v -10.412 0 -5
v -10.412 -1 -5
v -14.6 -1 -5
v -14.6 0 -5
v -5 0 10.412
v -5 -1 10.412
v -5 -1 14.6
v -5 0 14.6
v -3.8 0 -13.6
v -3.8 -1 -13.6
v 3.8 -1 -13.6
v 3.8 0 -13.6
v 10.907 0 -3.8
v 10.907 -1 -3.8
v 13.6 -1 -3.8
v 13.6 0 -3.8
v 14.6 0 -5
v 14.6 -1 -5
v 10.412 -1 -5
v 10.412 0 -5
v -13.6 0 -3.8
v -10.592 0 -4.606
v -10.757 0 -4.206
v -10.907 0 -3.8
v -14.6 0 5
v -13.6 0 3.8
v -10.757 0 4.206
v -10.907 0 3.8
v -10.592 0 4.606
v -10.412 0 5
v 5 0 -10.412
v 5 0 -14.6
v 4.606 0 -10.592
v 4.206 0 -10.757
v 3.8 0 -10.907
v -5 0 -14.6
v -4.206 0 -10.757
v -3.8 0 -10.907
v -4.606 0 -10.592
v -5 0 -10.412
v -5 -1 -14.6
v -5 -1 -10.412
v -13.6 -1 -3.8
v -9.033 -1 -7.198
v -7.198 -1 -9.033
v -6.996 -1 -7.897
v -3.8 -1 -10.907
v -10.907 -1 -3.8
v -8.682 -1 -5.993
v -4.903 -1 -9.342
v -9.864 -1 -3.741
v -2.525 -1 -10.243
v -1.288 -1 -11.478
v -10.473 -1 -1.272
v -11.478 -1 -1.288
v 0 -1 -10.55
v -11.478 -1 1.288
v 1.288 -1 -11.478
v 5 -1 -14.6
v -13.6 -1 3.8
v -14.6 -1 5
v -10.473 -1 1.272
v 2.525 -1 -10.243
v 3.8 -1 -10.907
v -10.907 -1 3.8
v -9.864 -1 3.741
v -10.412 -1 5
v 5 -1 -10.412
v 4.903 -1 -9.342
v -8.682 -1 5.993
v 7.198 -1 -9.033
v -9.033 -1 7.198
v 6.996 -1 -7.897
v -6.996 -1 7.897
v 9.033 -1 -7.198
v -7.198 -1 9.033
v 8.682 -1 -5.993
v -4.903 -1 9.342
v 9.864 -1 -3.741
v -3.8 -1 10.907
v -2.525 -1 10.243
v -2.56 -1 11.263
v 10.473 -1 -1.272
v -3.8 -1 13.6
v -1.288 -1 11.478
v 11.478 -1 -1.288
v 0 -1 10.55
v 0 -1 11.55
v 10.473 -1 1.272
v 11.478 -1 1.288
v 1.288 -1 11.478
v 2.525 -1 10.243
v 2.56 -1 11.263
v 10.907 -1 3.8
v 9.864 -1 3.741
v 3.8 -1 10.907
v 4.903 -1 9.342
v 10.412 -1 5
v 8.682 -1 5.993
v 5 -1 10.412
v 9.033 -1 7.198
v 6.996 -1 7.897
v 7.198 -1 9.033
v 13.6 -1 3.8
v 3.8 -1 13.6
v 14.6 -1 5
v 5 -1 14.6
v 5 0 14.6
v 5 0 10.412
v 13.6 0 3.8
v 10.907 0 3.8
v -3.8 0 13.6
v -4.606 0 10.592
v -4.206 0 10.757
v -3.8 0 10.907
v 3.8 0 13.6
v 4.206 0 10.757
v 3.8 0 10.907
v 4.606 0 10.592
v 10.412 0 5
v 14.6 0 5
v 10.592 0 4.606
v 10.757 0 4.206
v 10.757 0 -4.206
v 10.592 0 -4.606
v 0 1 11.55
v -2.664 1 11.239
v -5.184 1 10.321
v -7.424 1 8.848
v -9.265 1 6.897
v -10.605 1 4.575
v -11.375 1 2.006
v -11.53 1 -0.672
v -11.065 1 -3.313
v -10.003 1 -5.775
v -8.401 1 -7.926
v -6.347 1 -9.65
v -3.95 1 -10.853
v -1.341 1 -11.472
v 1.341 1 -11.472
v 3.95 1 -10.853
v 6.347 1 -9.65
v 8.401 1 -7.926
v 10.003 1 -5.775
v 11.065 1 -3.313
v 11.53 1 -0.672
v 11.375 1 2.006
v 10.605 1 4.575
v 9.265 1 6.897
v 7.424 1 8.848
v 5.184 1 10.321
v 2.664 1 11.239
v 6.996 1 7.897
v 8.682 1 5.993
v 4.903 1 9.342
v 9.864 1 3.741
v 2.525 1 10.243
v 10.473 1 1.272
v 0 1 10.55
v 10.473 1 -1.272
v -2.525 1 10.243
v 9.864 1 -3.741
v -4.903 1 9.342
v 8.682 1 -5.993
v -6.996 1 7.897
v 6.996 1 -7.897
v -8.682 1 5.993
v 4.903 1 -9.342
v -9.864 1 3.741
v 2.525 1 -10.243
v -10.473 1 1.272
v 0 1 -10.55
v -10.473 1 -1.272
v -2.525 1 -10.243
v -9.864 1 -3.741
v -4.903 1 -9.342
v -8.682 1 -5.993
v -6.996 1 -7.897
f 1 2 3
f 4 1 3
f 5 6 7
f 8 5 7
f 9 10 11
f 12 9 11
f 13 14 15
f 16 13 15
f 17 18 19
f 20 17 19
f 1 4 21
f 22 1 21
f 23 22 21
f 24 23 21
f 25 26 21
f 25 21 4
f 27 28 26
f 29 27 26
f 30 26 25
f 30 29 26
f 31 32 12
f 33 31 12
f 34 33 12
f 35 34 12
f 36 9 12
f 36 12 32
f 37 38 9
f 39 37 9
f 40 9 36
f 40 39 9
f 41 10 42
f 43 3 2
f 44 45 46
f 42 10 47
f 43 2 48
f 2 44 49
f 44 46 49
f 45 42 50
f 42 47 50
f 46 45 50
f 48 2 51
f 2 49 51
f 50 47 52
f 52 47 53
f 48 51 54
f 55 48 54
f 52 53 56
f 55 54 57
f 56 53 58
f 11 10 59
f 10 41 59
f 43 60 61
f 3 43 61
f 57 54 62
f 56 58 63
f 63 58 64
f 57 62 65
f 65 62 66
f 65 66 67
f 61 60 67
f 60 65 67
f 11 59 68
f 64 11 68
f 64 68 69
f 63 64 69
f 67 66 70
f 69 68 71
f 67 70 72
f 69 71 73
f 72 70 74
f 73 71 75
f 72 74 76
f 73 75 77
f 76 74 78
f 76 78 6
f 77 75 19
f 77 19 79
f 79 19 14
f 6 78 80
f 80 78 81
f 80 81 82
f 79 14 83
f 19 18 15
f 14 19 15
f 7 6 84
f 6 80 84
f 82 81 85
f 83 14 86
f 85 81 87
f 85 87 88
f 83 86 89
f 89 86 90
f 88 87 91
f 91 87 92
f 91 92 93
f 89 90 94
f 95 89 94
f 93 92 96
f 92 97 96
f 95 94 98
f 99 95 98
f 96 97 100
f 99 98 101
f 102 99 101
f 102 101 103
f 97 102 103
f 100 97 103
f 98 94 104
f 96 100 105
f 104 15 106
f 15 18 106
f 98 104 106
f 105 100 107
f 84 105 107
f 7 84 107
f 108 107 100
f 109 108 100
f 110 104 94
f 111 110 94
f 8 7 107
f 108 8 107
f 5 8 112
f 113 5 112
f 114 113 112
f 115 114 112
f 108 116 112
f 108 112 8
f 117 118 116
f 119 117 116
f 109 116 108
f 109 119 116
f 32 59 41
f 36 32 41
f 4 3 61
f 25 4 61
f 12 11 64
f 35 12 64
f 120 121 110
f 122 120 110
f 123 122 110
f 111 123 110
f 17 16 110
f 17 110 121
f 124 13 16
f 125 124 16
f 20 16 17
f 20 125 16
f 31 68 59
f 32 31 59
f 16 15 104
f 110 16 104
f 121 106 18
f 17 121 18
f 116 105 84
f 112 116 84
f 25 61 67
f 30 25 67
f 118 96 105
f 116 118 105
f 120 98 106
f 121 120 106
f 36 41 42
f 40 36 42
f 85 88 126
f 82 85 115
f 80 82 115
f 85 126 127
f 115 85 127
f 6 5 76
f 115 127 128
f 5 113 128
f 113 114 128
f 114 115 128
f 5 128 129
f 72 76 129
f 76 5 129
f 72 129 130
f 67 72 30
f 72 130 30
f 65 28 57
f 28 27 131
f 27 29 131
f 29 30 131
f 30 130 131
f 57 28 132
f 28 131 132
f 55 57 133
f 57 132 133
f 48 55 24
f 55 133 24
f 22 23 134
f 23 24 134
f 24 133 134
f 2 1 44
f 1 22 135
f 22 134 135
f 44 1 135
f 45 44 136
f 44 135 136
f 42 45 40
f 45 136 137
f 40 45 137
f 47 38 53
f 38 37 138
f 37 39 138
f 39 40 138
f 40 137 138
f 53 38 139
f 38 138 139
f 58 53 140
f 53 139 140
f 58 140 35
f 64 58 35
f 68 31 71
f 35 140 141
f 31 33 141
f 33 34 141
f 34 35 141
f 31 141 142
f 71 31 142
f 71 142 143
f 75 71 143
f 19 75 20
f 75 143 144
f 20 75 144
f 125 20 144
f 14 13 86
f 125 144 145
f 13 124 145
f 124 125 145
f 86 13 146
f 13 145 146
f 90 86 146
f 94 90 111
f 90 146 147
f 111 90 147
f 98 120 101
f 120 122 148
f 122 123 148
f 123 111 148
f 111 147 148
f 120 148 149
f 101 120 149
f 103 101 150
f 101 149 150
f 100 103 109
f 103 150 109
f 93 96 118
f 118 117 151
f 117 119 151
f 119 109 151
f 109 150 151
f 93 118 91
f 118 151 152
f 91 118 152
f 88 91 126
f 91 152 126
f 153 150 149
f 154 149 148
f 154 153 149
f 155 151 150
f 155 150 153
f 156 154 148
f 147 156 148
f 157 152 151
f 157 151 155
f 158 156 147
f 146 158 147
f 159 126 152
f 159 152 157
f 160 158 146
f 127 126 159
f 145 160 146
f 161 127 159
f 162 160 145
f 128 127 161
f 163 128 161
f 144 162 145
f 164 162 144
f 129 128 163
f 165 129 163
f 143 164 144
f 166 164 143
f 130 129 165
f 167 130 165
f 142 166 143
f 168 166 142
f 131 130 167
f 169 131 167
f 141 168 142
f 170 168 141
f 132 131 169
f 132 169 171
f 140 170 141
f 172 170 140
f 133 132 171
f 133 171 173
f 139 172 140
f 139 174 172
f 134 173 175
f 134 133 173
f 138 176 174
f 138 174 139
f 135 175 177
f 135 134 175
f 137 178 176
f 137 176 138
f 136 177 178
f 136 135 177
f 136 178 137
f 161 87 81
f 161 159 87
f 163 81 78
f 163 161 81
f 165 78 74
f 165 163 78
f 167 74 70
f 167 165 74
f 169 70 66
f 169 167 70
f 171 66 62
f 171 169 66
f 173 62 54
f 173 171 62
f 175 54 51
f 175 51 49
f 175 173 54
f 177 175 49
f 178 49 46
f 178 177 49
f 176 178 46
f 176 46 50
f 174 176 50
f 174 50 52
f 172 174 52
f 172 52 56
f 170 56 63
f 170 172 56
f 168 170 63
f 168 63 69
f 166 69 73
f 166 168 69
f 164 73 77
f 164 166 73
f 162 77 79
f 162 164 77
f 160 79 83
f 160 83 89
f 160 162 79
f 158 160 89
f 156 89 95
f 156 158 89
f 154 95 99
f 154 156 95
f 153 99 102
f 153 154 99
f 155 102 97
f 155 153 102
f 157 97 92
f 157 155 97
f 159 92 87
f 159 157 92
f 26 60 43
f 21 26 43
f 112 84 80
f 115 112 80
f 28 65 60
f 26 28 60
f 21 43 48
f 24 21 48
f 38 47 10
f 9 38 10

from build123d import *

# Parameters (mm, degrees)
CROQUIS1_W              = 1
CROQUIS1_H              = 2
SALIENTE_EXTRUIR1_START = -1
SALIENTE_EXTRUIR1_DEPTH = 1
MATRIZC1_COUNT          = 4


with BuildPart() as part:
    # Croquis1 → Revolución1 (revolve)
    with BuildSketch(Plane.XY, mode=Mode.PRIVATE) as revoluci_n1_sk:
        with Locations((11.05, 0)):
            Rectangle(CROQUIS1_W, CROQUIS1_H)
    revolve(revoluci_n1_sk.sketch.rotate(Axis((0, 18.472461404, 0), (0, -1, 0)), 90), axis=Axis((0, 18.472461404, 0), (0, -1, 0)))

    # Croquis2 → Saliente-Extruir1 (add)
    with BuildSketch(Plane(origin=(0, 0, 0), x_dir=(1, 0, 0), z_dir=(0, 1, 0)).offset(SALIENTE_EXTRUIR1_START)):
        Polygon((-5, -10.411652126), (-5, -14.6), (5, -14.6), (5, -10.411652126), (3.8, -10.411652126), (3.8, -10.90699317), (3.8, -13.6), (-3.8, -13.6), (-3.8, -10.90699317), (-3.8, -10.411652126), align=None)
    saliente_extruir1 = extrude(amount=SALIENTE_EXTRUIR1_DEPTH)

    # MatrizC1: Saliente-Extruir1 ×4 about axis
    matrizc1_axis = Axis((0, 0, 0), (0, 1, 0))
    for i in range(1, MATRIZC1_COUNT):
        add(saliente_extruir1.rotate(matrizc1_axis, i * 360 / MATRIZC1_COUNT))


solid = part.part
